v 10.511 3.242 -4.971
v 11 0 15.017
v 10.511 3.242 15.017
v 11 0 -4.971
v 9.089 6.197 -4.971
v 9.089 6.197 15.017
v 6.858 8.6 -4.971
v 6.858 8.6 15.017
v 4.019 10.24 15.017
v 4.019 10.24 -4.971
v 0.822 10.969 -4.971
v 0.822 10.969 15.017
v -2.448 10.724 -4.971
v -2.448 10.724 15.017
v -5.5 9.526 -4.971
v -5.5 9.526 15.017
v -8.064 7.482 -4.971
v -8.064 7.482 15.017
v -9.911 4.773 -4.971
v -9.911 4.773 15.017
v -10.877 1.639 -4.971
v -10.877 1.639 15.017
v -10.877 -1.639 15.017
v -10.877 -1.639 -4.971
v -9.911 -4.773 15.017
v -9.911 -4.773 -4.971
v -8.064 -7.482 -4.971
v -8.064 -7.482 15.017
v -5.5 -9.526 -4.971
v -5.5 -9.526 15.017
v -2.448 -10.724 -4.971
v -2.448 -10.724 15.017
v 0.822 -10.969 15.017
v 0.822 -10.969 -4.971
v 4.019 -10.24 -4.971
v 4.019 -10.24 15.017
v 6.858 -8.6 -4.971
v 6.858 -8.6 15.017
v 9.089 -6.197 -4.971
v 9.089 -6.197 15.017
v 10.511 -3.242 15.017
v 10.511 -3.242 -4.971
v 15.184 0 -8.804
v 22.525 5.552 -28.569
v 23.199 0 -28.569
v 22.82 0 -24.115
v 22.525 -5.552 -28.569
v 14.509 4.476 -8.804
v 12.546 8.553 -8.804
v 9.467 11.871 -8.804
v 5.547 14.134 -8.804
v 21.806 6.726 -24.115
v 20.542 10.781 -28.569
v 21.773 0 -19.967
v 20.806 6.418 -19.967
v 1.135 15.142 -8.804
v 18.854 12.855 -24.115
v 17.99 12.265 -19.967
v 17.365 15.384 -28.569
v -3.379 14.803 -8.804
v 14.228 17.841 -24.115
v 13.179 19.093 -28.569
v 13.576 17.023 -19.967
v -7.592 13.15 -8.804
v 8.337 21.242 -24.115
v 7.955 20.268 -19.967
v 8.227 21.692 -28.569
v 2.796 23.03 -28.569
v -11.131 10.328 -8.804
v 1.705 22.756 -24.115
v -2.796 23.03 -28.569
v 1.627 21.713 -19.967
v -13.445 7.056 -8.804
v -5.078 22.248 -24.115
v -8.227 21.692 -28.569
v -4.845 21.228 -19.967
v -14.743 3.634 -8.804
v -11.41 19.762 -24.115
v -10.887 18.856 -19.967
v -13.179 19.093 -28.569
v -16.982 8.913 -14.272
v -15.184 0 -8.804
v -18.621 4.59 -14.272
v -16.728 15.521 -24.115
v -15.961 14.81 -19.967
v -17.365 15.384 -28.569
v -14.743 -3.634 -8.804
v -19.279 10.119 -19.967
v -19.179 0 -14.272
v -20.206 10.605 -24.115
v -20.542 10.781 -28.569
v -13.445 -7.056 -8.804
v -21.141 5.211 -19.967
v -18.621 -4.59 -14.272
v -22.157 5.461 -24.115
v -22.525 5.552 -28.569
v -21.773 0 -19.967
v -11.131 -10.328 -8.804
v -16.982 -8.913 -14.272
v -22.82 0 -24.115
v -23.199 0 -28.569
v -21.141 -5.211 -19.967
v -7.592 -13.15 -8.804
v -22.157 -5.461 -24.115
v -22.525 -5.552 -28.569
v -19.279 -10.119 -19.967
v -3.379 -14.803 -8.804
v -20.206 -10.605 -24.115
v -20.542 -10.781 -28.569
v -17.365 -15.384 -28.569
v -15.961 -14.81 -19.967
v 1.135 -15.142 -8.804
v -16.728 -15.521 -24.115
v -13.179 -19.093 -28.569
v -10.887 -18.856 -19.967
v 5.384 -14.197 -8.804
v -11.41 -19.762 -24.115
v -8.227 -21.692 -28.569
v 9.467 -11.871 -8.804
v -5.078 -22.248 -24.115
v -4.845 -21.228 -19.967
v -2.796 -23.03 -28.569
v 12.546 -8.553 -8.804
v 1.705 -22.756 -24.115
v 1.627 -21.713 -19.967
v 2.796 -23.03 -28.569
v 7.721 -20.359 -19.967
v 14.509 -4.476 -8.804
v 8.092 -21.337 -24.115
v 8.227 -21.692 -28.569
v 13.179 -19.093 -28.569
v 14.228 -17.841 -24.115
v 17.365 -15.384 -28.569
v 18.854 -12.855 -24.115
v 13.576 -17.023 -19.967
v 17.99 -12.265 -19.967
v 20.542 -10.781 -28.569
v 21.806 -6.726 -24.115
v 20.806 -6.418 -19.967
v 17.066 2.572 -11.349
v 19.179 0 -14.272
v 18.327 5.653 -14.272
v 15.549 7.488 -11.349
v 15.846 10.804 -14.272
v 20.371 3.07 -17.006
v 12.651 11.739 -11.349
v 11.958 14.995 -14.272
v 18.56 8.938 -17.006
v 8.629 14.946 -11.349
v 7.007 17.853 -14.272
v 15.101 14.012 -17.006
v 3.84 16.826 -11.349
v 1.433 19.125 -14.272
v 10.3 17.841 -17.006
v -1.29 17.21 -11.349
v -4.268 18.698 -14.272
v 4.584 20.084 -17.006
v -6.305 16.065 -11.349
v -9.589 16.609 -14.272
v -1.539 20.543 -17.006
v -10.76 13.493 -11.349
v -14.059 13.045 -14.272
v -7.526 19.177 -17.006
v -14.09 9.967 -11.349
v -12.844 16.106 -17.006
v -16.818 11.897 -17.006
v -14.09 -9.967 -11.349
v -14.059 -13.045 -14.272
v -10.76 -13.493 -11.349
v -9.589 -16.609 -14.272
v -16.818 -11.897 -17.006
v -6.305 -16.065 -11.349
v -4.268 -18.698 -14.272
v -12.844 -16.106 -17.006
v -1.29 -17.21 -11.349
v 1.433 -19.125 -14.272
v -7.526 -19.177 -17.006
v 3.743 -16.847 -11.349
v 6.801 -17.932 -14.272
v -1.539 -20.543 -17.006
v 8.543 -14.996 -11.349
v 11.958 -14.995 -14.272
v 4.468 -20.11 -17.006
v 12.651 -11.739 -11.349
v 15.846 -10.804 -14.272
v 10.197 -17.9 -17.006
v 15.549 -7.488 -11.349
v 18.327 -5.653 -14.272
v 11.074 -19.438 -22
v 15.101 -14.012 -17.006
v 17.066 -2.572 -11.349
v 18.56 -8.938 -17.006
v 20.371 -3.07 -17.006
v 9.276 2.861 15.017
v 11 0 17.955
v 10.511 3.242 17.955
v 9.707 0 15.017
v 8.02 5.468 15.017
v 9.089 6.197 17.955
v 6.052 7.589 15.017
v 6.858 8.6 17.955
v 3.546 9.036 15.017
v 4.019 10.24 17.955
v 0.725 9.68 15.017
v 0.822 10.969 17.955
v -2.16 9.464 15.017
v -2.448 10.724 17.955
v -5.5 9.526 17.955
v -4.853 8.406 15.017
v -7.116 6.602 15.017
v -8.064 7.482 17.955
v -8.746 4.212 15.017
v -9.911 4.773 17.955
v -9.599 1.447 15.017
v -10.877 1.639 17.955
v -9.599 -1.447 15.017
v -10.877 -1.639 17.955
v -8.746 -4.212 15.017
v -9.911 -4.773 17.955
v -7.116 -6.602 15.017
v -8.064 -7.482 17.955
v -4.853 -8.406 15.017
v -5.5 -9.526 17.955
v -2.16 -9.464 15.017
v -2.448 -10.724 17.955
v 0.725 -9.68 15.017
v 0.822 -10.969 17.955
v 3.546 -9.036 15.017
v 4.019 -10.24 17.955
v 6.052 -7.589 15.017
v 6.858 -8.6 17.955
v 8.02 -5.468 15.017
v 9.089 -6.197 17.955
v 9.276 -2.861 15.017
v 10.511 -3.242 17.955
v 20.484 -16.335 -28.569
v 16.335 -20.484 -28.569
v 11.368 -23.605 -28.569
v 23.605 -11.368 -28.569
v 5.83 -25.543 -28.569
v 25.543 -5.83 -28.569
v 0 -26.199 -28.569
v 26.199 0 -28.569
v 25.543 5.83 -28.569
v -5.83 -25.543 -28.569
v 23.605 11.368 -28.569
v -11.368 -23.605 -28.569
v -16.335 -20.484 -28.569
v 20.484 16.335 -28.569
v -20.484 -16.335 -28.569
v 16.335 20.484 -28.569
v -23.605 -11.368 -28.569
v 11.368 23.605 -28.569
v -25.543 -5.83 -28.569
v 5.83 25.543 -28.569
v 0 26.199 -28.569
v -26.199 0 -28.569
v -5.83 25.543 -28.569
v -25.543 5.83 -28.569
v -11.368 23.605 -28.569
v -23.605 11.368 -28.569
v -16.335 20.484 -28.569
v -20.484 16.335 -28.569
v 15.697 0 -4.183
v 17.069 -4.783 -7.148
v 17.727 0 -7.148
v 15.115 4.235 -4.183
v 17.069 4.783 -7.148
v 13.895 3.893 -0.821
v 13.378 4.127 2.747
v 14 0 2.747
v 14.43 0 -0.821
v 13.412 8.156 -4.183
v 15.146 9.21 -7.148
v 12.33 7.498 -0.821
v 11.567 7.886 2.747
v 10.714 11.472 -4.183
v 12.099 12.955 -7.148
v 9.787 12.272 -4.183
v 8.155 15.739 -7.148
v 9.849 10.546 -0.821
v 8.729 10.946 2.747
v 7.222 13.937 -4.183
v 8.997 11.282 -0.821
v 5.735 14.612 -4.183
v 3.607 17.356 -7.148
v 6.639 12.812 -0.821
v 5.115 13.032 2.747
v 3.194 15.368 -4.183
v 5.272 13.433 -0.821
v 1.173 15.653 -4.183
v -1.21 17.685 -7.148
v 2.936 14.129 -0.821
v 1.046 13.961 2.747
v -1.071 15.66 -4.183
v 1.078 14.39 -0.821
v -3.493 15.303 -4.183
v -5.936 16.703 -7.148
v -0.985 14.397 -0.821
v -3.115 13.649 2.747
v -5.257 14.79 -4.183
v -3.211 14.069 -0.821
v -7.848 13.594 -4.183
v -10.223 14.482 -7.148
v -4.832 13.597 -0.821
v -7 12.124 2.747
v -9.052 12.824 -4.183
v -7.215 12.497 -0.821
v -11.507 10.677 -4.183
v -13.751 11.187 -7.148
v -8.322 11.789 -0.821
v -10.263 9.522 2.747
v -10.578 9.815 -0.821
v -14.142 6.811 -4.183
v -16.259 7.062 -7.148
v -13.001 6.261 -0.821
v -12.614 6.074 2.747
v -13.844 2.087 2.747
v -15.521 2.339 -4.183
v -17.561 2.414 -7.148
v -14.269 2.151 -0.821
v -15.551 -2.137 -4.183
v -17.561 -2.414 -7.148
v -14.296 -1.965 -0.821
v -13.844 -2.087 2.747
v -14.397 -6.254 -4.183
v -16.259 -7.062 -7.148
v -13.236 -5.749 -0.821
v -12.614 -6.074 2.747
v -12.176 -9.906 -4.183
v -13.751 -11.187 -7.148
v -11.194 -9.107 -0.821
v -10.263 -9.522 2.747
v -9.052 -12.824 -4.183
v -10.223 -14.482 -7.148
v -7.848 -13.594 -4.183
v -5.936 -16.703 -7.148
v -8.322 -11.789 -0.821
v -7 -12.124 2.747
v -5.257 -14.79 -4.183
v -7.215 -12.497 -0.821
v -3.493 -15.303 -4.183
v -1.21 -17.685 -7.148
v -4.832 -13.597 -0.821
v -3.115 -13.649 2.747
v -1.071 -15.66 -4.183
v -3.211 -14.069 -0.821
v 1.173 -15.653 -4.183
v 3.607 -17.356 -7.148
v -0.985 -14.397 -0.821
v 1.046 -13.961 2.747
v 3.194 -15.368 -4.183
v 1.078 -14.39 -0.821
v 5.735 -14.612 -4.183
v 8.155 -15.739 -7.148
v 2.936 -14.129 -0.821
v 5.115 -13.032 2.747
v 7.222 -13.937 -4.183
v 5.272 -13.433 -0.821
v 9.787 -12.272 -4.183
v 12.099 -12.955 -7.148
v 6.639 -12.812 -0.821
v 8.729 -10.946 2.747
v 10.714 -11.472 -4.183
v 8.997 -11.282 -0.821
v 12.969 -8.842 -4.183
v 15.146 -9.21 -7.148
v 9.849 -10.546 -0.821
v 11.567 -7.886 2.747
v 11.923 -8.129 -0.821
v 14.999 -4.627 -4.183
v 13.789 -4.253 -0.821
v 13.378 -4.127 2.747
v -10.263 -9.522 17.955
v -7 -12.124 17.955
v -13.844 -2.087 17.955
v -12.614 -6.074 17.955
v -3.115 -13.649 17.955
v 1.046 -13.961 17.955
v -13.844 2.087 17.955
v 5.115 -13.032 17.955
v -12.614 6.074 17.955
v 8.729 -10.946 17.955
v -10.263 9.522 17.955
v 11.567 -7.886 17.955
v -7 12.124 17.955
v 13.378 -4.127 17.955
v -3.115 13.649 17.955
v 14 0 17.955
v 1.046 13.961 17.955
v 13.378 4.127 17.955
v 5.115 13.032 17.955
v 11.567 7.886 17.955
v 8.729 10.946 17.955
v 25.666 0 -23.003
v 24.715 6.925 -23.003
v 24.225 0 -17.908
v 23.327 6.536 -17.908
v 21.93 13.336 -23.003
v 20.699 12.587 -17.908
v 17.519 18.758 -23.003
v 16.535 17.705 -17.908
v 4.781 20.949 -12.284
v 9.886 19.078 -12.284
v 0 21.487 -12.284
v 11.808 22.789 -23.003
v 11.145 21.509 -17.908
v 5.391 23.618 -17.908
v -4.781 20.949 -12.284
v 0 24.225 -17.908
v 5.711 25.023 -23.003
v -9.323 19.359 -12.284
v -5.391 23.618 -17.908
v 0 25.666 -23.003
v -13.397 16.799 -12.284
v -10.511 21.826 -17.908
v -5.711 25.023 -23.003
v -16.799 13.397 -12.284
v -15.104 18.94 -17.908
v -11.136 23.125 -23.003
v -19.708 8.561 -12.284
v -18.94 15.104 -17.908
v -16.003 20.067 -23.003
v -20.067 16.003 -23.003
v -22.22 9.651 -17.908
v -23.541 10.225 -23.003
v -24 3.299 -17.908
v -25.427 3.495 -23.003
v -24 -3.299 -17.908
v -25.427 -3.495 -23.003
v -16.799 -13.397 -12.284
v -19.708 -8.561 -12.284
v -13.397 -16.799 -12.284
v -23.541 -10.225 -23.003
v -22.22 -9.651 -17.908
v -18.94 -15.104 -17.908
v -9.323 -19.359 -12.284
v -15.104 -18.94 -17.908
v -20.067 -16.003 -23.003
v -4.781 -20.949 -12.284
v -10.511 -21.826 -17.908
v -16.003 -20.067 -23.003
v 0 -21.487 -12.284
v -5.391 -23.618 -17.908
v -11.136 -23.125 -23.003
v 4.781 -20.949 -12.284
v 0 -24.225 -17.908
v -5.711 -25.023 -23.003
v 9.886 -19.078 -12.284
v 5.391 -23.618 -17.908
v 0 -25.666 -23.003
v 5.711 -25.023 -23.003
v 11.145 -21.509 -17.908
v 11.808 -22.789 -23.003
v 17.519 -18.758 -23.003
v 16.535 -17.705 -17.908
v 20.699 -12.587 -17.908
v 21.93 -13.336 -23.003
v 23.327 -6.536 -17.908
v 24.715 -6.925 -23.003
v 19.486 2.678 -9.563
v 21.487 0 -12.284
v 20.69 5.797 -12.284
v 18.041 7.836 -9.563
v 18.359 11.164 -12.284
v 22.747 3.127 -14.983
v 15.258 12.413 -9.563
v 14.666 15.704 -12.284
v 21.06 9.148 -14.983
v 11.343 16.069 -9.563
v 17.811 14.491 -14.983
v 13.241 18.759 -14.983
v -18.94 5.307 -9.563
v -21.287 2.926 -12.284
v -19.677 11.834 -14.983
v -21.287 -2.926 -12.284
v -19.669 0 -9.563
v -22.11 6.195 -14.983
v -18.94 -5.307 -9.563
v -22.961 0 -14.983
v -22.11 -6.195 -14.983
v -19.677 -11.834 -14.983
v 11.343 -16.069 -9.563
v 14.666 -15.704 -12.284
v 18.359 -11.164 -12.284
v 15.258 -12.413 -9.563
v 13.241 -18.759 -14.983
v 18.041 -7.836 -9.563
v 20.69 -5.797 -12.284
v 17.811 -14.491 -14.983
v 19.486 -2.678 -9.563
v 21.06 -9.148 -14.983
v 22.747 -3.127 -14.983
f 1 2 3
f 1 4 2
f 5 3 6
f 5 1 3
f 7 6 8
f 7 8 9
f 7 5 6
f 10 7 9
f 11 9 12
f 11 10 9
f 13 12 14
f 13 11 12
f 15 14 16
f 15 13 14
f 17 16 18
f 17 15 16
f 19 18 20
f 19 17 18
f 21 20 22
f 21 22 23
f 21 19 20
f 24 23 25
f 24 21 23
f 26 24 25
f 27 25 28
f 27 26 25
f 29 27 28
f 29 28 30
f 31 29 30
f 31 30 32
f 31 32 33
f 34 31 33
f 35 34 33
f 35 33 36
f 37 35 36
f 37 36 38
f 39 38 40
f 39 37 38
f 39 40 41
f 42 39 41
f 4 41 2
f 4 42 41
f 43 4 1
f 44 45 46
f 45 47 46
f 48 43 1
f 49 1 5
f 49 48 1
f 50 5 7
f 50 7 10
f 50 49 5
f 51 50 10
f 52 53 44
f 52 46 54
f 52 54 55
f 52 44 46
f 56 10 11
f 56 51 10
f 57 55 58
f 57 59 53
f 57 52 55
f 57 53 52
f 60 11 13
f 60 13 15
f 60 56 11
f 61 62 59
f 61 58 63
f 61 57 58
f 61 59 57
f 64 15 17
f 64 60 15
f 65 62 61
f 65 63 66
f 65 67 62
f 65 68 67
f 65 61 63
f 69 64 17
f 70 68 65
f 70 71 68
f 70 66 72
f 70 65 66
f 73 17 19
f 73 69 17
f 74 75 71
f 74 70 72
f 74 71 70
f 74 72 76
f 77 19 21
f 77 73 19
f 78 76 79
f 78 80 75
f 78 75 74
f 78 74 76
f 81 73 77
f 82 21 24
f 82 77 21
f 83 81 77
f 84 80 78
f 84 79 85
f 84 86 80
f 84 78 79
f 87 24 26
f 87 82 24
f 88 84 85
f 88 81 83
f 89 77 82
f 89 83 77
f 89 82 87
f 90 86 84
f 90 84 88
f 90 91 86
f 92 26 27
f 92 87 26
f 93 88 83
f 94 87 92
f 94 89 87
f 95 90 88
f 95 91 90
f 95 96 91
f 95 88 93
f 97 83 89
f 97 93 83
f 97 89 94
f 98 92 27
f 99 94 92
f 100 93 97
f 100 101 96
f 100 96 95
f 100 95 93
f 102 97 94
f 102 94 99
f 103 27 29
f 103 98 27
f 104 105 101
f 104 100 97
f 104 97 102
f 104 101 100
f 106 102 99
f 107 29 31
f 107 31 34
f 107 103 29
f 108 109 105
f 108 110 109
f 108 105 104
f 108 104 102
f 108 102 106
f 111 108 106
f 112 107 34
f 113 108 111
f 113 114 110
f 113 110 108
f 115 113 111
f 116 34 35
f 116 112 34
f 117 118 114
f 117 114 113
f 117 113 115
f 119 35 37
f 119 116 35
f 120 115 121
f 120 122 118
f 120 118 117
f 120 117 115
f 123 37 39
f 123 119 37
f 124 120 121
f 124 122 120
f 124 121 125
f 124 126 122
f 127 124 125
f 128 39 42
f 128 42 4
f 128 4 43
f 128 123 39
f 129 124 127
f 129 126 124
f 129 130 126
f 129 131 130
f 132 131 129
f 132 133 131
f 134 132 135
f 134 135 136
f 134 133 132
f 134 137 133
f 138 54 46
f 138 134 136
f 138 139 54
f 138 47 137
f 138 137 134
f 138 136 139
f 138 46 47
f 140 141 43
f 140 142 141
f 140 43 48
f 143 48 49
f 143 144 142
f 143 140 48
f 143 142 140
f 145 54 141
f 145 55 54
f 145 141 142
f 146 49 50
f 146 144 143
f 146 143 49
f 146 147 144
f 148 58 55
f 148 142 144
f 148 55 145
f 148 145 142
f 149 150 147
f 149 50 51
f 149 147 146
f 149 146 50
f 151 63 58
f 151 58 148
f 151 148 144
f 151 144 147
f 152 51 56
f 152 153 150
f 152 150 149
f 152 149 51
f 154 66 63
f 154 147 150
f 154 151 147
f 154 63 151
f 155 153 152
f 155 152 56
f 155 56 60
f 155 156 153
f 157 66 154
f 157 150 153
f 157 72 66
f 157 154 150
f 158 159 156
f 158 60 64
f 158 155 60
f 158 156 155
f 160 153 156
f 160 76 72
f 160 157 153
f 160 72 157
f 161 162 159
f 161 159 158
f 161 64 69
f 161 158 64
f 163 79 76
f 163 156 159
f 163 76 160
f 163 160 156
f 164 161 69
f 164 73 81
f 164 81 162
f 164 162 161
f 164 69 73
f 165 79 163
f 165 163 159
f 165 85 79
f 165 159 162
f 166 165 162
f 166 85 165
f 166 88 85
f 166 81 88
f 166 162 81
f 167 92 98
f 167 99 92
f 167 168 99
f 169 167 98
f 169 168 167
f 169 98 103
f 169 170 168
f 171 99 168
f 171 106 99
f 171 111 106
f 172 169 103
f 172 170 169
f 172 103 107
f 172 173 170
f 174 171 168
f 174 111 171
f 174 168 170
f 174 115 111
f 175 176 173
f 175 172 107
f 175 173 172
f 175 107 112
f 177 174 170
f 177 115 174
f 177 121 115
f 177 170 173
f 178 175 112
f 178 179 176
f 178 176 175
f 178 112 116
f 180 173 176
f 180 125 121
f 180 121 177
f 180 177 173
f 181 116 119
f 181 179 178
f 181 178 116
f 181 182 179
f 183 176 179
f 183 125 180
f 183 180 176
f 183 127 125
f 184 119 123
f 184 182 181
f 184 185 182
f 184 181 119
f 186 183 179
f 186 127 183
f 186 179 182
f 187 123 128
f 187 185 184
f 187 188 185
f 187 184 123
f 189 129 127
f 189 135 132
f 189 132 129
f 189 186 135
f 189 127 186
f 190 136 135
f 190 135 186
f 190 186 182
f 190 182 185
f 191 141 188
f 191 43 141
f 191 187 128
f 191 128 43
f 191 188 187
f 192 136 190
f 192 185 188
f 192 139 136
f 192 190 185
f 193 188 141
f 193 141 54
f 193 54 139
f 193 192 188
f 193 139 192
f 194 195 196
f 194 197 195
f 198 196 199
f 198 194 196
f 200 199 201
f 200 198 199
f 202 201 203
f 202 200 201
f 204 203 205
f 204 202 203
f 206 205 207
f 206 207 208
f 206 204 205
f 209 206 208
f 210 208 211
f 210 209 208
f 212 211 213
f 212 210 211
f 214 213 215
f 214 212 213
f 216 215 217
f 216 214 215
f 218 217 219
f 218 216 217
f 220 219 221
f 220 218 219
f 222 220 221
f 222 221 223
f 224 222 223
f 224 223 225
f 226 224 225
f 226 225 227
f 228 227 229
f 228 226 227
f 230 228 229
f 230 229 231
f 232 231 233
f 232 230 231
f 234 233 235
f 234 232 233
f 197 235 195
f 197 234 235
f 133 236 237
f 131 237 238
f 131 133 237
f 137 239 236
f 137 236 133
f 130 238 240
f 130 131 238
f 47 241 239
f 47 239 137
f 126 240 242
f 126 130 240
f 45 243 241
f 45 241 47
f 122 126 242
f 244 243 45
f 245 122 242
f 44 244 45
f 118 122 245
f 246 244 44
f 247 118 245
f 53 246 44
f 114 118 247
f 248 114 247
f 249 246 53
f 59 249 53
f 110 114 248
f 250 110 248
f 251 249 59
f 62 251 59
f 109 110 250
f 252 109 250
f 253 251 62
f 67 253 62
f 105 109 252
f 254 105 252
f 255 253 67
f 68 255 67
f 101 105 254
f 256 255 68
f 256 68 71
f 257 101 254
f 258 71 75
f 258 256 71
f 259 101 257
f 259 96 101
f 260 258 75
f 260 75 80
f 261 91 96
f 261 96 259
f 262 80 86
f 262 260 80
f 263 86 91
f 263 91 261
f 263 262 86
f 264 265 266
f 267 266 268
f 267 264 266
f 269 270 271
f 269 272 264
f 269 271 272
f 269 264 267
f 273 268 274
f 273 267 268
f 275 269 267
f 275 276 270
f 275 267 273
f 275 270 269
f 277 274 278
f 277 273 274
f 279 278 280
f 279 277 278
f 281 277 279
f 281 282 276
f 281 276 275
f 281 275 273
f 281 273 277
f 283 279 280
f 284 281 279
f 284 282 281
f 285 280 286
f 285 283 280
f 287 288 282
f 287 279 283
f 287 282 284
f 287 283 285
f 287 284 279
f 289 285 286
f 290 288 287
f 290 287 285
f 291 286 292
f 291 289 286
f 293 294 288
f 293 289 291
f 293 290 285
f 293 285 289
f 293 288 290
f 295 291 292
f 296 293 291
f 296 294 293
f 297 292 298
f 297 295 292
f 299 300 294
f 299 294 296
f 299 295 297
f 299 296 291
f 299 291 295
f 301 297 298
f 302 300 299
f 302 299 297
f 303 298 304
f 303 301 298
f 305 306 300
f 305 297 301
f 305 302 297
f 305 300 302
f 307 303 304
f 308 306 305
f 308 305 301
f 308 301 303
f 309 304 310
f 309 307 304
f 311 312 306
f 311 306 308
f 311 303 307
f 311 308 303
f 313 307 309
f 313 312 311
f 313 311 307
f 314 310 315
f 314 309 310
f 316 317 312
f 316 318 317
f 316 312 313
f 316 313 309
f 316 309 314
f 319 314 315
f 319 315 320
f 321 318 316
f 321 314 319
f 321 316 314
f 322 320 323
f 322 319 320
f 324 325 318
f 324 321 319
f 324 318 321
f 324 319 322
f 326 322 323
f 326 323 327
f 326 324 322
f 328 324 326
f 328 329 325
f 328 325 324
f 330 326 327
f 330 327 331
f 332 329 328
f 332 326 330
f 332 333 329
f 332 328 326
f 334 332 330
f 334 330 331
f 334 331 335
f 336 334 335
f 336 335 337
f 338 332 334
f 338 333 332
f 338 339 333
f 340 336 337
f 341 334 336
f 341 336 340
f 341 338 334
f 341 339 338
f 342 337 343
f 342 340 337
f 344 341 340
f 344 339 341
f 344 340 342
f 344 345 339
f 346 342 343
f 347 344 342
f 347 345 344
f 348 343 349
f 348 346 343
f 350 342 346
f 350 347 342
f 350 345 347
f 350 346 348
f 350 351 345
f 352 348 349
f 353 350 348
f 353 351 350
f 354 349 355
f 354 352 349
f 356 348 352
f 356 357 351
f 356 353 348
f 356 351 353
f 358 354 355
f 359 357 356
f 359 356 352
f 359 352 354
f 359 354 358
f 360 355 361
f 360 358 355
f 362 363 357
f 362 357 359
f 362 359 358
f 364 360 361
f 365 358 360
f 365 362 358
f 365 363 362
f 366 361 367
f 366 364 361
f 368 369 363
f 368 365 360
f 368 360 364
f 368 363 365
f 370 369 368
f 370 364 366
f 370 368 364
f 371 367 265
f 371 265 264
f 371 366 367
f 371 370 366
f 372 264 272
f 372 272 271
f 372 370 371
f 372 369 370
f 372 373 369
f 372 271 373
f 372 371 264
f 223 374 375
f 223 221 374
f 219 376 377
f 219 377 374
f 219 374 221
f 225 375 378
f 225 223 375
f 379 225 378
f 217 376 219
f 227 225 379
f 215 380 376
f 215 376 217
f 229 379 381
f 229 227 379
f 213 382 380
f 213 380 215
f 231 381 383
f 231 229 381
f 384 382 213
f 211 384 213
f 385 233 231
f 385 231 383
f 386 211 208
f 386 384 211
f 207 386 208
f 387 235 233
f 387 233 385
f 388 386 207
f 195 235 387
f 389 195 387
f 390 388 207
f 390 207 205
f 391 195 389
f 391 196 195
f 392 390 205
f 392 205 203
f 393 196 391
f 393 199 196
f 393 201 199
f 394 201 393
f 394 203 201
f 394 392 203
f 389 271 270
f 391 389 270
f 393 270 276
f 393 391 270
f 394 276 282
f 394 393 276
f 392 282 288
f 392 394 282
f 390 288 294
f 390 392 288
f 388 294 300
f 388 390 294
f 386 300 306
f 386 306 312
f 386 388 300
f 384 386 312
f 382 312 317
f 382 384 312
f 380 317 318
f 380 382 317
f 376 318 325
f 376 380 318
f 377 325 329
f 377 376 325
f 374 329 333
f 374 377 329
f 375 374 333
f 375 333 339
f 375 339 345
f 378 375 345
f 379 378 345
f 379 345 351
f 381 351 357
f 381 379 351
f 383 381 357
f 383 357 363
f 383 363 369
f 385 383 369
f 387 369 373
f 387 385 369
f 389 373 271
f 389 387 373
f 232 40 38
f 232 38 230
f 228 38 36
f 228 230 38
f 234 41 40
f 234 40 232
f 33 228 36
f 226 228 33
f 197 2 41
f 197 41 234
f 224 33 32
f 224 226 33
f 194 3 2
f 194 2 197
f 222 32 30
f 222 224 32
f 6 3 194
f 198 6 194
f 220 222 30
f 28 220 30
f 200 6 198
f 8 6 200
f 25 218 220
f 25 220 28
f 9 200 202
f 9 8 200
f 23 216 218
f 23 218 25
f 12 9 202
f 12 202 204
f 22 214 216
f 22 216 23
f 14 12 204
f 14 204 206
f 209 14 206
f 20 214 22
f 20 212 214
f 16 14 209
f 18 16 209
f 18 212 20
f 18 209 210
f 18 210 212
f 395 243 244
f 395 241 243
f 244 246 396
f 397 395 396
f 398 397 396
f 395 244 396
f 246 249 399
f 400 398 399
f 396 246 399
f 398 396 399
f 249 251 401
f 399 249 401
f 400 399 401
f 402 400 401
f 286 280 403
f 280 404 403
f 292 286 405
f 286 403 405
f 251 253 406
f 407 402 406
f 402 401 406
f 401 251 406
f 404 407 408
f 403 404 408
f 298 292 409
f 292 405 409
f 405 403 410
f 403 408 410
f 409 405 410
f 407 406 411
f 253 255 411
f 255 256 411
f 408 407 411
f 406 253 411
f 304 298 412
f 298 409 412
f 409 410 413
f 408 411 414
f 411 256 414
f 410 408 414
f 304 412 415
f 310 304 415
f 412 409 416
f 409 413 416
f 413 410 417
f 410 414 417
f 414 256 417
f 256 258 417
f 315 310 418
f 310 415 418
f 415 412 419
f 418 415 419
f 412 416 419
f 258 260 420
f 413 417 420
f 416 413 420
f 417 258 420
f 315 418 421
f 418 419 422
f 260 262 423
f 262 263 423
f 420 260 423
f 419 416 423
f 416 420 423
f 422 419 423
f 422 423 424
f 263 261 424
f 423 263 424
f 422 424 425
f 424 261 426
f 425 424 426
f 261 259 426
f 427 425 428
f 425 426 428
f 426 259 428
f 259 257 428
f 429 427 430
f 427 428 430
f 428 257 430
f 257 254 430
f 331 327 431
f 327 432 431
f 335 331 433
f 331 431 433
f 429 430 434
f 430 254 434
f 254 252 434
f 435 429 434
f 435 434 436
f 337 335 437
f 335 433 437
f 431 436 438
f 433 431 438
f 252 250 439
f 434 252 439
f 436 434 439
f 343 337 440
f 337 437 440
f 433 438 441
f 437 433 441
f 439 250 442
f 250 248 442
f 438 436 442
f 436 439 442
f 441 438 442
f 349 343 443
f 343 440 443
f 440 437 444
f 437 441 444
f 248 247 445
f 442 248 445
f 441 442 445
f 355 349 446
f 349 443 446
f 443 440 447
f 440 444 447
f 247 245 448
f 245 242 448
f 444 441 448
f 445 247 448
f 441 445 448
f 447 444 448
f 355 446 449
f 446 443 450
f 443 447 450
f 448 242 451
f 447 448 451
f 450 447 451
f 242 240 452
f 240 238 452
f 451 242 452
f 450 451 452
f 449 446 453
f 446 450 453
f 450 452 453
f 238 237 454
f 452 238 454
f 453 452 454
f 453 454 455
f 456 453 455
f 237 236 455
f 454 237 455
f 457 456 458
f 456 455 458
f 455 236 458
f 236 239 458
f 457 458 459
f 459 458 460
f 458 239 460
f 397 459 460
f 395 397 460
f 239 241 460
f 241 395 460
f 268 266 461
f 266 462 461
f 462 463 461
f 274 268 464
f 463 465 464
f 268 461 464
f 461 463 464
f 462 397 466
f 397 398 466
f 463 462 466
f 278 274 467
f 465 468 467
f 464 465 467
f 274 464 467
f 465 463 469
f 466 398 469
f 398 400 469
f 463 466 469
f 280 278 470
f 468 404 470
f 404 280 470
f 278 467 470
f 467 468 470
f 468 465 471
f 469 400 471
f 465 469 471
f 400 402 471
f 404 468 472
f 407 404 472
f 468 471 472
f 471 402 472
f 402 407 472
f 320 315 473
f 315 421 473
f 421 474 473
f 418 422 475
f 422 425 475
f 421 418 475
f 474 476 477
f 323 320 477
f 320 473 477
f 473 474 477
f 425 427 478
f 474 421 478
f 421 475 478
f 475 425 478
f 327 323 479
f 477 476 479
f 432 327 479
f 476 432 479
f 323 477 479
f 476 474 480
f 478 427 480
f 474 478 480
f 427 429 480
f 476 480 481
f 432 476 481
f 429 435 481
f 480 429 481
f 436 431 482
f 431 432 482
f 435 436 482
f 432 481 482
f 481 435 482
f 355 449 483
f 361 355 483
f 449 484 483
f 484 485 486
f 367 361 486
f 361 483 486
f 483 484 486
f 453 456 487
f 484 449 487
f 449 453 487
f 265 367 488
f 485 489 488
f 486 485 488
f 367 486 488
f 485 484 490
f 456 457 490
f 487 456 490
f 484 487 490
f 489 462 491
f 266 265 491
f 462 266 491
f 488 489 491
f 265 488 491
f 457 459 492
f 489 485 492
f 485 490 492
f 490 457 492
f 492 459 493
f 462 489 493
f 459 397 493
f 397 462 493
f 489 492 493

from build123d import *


# Not quite as in the source:
# - ends of sketch curves that miss each other by under 0.0002 mm in the source are joined
# - the dataset's text gives a spline's control points without its knots; the knots are read off the source's solid


with BuildPart() as f1:
    # F0 (on Front) → F1 (revolve)
    with BuildSketch(Plane.XZ):
        Polygon((9.7069498152, 15.0171099231), (11, 15.0171099231), (11, 17.9548243945), align=None)
        with BuildLine():
            Line((11, 15.0171099231), (11, 10.5107510462))
            Line((11, 10.5107510462), (11, -4.9711427956))
            add(Edge.make_bspline(
                [(11, -4.9711427956), (16.2437419004, -8.8163125959), (23.19943312, -17.5511940928), (23.1994349799, -28.5690823316)],
                knots=[0, 0, 0, 0, 26.5648068726, 26.5648068726, 26.5648068726, 26.5648068726], degree=3))
            Line((23.1994349799, -28.5690823316), (26.1994349799, -28.5690823316))
            add(Edge.make_bspline(
                [(17.7265217002, -7.1481812805), (19.1095590047, -8.7235328339), (21.9155043848, -12.5059639132), (25.2274131623, -19.6838085881), (26.1994344616, -25.4989553681), (26.1994349799, -28.5690823316)],
                knots=[0.2712350474, 0.2712350474, 0.2712350474, 0.2712350474, 0.5, 0.75, 1, 1, 1, 1], degree=3))
            ThreePointArc((17.7265217002, -7.1481812805), (14.962499563, -2.5400303169), (14, 2.7466114794))
            Line((14, 2.7466114794), (14, 17.9548243945))
            Line((14, 17.9548243945), (11, 17.9548243945))
            Line((11, 17.9548243945), (11, 15.0171099231))
        make_face()
    revolve(axis=Axis((0, 0, 14.5892715082), (0, 0, 1)))


solid = f1.part
